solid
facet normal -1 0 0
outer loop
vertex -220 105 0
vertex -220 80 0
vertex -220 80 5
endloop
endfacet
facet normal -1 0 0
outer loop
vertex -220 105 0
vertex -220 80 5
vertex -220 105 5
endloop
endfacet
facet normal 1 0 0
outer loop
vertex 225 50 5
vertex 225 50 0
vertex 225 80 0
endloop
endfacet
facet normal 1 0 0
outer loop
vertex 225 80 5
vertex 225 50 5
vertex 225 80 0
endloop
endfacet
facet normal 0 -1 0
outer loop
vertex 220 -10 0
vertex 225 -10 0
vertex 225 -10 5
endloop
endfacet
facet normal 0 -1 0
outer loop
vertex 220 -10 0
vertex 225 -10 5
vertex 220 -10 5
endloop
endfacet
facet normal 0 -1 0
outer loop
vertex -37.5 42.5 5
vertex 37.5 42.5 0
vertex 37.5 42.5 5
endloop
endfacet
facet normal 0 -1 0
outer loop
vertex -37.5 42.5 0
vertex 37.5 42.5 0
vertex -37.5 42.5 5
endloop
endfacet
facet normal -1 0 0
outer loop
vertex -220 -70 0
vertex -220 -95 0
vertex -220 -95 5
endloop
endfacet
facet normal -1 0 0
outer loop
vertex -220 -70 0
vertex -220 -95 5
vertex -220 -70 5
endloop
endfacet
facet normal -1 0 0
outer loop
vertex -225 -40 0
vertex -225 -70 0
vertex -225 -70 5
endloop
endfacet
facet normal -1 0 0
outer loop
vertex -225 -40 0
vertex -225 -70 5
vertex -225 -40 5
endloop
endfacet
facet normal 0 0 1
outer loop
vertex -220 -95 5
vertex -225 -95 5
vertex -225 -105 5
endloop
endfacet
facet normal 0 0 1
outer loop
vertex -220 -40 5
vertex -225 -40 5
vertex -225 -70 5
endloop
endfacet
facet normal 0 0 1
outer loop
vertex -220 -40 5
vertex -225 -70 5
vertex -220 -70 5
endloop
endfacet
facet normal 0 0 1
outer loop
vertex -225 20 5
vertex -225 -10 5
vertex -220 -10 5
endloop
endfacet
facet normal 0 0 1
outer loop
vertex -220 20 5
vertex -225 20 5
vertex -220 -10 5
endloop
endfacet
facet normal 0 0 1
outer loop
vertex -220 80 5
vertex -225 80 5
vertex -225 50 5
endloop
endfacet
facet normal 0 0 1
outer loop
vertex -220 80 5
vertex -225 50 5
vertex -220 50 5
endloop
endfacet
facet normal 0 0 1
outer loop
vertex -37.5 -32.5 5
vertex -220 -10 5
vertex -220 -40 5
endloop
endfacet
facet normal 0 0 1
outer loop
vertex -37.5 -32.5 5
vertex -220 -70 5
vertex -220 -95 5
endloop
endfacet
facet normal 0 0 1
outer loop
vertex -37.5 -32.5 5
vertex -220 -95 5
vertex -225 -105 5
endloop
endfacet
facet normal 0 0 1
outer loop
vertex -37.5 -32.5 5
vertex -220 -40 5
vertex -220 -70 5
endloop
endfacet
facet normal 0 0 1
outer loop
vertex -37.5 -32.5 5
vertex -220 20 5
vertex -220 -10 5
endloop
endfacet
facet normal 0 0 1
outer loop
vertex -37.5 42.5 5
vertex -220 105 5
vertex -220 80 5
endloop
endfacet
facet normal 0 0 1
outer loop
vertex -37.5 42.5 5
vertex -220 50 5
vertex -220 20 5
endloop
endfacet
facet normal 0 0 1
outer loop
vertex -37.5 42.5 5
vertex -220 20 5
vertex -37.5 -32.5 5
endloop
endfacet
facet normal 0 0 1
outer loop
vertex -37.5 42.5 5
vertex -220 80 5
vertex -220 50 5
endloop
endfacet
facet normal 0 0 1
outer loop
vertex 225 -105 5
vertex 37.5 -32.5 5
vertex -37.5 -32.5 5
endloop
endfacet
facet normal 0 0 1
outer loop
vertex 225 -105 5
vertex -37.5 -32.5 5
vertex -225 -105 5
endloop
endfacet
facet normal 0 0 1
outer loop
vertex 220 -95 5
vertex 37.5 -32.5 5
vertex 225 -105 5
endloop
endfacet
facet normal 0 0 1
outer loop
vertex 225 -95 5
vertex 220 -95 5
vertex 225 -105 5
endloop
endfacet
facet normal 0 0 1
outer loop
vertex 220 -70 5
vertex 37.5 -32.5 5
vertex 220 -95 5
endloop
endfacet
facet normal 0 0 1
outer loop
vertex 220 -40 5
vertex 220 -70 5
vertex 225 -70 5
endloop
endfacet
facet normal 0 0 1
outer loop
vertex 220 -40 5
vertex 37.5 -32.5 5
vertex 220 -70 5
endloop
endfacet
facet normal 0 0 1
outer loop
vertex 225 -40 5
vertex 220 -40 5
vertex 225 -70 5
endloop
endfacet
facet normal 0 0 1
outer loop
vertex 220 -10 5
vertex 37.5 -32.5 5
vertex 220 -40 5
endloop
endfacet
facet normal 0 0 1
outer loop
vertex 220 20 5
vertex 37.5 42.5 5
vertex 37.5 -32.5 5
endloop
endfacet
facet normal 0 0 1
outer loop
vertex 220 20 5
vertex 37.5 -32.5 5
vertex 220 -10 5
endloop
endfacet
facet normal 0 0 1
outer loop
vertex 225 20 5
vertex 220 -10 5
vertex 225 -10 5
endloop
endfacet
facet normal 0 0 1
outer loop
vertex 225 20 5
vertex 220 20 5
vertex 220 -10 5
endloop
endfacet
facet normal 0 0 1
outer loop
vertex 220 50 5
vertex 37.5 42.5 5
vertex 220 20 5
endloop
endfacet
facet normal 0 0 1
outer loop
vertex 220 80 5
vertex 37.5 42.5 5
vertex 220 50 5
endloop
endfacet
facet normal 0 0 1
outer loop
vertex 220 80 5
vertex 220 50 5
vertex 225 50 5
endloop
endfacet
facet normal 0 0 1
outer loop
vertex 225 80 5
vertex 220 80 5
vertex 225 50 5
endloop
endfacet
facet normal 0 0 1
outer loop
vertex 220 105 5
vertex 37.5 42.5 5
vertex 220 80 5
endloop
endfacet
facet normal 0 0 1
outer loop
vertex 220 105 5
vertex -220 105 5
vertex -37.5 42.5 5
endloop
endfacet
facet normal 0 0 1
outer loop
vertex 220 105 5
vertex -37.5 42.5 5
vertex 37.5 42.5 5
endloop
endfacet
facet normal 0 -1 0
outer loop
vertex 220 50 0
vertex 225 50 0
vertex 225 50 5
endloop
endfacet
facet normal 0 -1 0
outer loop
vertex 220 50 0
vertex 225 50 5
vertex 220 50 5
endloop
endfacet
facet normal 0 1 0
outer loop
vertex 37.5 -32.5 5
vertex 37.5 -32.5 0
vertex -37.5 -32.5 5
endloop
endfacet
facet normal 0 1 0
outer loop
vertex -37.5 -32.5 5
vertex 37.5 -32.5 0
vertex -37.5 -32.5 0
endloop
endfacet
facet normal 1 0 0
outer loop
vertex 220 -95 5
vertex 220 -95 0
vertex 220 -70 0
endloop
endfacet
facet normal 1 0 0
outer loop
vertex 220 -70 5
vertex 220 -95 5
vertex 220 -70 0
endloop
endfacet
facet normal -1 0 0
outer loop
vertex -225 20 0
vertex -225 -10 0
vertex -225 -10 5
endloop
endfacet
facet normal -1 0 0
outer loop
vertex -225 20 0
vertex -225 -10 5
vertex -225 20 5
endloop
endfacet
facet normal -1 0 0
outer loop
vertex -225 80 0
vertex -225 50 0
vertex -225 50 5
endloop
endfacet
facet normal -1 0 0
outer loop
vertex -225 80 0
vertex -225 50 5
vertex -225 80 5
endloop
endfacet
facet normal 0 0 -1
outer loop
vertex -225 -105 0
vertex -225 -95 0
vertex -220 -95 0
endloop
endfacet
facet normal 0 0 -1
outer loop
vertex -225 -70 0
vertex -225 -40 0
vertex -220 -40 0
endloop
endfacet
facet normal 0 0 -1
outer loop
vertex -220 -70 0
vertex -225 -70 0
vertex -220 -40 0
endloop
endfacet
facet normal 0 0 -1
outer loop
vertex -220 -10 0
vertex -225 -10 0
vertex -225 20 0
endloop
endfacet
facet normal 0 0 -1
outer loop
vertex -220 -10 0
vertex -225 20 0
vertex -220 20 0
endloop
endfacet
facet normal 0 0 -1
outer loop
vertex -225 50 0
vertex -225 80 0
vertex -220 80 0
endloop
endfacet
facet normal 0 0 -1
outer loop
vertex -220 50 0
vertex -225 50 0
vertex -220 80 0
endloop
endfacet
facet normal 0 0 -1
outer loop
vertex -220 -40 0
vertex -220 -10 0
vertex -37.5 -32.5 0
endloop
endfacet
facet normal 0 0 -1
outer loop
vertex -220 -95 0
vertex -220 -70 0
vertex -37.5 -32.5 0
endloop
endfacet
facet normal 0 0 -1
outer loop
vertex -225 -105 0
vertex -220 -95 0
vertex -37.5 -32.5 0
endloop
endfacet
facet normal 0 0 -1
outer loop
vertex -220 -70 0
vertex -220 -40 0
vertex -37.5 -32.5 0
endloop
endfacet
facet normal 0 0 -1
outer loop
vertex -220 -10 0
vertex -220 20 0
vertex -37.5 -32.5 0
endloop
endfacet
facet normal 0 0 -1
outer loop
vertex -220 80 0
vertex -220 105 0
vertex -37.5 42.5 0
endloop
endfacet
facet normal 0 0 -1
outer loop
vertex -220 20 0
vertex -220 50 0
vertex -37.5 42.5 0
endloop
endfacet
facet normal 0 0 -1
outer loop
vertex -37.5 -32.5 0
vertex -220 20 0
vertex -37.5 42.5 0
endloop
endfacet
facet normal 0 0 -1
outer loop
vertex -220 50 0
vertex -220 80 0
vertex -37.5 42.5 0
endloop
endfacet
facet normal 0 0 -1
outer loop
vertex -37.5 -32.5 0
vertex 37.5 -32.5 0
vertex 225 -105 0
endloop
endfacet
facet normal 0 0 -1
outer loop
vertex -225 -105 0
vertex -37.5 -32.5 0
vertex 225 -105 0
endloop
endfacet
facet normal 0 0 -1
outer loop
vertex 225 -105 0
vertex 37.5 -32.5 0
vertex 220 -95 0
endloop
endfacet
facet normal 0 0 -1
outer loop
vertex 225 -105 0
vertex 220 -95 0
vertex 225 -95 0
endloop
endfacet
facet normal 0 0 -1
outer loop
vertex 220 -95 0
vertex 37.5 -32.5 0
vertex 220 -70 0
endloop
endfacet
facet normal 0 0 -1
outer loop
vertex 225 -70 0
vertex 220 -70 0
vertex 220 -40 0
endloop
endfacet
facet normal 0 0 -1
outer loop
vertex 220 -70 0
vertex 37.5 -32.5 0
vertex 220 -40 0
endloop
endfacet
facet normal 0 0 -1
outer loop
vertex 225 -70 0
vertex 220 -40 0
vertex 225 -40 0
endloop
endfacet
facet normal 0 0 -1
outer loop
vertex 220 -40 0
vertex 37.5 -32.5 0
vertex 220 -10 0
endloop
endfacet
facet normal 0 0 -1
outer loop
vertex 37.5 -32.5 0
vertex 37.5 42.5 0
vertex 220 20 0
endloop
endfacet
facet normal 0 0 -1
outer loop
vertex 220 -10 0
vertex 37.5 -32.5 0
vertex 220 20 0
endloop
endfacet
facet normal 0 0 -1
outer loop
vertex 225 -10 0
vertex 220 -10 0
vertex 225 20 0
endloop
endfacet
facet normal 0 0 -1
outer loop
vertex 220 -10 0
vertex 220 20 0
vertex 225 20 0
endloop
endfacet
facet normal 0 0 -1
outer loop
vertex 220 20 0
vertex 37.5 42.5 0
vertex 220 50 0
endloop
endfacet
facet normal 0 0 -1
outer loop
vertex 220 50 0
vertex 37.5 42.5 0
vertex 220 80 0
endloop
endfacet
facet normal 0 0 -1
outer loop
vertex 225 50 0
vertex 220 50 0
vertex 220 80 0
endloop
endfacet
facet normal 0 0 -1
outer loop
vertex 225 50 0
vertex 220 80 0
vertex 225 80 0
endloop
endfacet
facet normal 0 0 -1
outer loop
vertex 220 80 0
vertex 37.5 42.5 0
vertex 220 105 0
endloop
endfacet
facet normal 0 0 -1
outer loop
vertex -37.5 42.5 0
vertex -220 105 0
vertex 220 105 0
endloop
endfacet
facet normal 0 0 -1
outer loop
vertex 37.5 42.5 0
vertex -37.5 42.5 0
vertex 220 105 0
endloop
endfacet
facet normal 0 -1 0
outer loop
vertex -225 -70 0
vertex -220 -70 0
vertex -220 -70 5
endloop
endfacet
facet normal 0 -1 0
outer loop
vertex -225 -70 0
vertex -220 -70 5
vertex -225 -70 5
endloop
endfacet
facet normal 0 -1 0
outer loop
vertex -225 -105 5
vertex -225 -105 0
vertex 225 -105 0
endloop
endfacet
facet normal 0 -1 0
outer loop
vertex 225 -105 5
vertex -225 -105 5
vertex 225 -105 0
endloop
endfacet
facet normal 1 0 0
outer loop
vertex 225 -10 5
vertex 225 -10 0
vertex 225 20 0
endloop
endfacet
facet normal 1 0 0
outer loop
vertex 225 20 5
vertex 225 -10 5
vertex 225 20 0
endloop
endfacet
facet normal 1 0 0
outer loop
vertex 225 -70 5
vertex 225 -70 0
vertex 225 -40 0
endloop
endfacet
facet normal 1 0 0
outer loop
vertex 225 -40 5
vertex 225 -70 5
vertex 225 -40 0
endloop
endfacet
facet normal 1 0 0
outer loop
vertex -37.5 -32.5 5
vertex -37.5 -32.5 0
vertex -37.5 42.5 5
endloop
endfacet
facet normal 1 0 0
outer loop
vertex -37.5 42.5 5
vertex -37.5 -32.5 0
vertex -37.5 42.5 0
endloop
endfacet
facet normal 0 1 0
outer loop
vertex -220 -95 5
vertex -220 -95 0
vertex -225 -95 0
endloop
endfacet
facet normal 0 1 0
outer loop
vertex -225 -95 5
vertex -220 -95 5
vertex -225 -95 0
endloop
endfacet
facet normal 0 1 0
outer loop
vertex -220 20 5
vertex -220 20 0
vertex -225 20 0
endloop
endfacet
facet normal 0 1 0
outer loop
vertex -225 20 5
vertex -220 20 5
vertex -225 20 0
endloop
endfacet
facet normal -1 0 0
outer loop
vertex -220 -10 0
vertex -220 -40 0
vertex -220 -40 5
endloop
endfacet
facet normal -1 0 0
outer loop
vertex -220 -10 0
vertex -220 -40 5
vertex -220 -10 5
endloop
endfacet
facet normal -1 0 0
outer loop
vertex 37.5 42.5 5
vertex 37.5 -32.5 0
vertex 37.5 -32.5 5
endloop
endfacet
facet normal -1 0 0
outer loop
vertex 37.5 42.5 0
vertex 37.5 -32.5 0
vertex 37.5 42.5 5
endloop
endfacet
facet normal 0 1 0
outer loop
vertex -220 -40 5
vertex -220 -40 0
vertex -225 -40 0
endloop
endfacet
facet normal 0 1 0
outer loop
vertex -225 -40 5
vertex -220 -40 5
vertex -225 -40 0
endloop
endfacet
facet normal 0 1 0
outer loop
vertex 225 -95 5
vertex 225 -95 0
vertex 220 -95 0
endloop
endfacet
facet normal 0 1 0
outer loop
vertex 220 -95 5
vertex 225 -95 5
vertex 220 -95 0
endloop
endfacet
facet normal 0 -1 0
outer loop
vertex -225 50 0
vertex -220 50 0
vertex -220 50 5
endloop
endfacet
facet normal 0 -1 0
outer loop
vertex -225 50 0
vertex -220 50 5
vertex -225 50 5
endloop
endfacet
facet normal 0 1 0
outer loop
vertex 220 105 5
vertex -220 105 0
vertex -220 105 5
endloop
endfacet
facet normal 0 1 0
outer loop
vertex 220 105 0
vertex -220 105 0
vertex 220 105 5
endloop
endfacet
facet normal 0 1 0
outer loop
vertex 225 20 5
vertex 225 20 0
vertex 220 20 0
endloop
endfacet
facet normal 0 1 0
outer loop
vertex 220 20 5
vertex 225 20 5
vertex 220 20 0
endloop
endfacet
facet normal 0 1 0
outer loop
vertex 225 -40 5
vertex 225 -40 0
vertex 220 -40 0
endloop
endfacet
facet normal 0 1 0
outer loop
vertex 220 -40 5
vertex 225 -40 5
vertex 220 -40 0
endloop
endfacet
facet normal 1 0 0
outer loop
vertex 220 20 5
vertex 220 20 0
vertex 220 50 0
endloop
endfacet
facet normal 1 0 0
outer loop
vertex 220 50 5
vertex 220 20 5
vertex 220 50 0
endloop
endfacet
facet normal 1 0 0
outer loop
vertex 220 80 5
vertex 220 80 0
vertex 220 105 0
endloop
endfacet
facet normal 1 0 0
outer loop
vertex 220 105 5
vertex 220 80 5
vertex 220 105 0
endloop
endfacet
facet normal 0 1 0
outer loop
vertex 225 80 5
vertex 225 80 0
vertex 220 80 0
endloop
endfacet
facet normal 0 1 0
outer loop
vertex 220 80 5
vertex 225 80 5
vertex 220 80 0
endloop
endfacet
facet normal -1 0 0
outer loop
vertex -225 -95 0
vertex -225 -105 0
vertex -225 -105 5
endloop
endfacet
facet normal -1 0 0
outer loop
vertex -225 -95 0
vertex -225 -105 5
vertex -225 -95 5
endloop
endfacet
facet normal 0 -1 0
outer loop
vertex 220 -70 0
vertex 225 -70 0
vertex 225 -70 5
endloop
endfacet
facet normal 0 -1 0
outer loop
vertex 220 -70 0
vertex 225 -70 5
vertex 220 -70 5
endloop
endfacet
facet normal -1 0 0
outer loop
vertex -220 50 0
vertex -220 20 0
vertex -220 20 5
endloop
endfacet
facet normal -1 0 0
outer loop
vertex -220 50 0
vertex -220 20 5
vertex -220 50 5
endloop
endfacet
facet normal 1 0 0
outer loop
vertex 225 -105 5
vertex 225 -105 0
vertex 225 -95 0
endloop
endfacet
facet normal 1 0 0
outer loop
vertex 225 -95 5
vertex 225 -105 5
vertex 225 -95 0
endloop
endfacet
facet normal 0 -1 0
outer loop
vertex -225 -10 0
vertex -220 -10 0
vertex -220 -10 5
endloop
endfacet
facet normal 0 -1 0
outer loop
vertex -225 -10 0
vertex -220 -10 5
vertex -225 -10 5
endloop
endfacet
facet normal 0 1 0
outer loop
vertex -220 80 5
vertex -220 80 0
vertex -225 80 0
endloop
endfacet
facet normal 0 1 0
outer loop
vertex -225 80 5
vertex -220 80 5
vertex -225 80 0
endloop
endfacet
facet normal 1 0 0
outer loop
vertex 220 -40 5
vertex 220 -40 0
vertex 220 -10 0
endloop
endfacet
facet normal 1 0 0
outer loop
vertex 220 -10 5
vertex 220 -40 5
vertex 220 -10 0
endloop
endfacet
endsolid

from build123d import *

# Parameters (mm, degrees)
SKETCH1_W           = 450
SKETCH1_H           = 210
BOSS_EXTRUDE1_DEPTH = 5
SKETCH3_W           = 65.821391225
SKETCH3_H           = 25
SKETCH3_W_2         = 143.228691138
SKETCH3_H_2         = 30
SKETCH3_W_3         = 192.205874683
SKETCH3_W_4         = 194.707934706
SKETCH3_W_5         = 70.821391225
SKETCH3_W_6         = 148.228691138
SKETCH3_W_7         = 194.705874683
SKETCH3_W_8         = 199.707934706
CUT_EXTRUDE1_DEPTH  = 6
SKETCH4_W           = 75
SKETCH4_H           = 75
CUT_EXTRUDE2_DEPTH  = 6


with BuildPart() as part:
    # Sketch1 → Boss-Extrude1 (new body)
    with BuildSketch(Plane.XY):
        Rectangle(SKETCH1_W, SKETCH1_H)
    extrude(amount=BOSS_EXTRUDE1_DEPTH)

    # Sketch3 → Cut-Extrude1 (cut, through all)
    with BuildSketch(Plane(origin=(0, 0, 0), x_dir=(-1, 0, 0), z_dir=(0, 0, -1))):
        with Locations((-252.910695613, 92.5)):
            Rectangle(SKETCH3_W, SKETCH3_H)
        with Locations((-291.614345569, 35)):
            Rectangle(SKETCH3_W_2, SKETCH3_H_2)
        with Locations((-316.102937342, -25)):
            Rectangle(SKETCH3_W_3, SKETCH3_H_2)
        with Locations((-317.353967353, -82.5)):
            Rectangle(SKETCH3_W_4, SKETCH3_H)
        with Locations((255.410695613, 92.5)):
            Rectangle(SKETCH3_W_5, SKETCH3_H)
        with Locations((294.114345569, 35)):
            Rectangle(SKETCH3_W_6, SKETCH3_H_2)
        with Locations((317.352937342, -25)):
            Rectangle(SKETCH3_W_7, SKETCH3_H_2)
        with Locations((319.853967353, -82.5)):
            Rectangle(SKETCH3_W_8, SKETCH3_H)
    extrude(amount=-CUT_EXTRUDE1_DEPTH, mode=Mode.SUBTRACT)

    # Sketch4 → Cut-Extrude2 (cut, through all)
    with BuildSketch(Plane(origin=(0, 0, 0), x_dir=(-1, 0, 0), z_dir=(0, 0, -1))):
        with Locations((0, 5)):
            Rectangle(SKETCH4_W, SKETCH4_H)
    extrude(amount=-CUT_EXTRUDE2_DEPTH, mode=Mode.SUBTRACT)


solid = part.part
